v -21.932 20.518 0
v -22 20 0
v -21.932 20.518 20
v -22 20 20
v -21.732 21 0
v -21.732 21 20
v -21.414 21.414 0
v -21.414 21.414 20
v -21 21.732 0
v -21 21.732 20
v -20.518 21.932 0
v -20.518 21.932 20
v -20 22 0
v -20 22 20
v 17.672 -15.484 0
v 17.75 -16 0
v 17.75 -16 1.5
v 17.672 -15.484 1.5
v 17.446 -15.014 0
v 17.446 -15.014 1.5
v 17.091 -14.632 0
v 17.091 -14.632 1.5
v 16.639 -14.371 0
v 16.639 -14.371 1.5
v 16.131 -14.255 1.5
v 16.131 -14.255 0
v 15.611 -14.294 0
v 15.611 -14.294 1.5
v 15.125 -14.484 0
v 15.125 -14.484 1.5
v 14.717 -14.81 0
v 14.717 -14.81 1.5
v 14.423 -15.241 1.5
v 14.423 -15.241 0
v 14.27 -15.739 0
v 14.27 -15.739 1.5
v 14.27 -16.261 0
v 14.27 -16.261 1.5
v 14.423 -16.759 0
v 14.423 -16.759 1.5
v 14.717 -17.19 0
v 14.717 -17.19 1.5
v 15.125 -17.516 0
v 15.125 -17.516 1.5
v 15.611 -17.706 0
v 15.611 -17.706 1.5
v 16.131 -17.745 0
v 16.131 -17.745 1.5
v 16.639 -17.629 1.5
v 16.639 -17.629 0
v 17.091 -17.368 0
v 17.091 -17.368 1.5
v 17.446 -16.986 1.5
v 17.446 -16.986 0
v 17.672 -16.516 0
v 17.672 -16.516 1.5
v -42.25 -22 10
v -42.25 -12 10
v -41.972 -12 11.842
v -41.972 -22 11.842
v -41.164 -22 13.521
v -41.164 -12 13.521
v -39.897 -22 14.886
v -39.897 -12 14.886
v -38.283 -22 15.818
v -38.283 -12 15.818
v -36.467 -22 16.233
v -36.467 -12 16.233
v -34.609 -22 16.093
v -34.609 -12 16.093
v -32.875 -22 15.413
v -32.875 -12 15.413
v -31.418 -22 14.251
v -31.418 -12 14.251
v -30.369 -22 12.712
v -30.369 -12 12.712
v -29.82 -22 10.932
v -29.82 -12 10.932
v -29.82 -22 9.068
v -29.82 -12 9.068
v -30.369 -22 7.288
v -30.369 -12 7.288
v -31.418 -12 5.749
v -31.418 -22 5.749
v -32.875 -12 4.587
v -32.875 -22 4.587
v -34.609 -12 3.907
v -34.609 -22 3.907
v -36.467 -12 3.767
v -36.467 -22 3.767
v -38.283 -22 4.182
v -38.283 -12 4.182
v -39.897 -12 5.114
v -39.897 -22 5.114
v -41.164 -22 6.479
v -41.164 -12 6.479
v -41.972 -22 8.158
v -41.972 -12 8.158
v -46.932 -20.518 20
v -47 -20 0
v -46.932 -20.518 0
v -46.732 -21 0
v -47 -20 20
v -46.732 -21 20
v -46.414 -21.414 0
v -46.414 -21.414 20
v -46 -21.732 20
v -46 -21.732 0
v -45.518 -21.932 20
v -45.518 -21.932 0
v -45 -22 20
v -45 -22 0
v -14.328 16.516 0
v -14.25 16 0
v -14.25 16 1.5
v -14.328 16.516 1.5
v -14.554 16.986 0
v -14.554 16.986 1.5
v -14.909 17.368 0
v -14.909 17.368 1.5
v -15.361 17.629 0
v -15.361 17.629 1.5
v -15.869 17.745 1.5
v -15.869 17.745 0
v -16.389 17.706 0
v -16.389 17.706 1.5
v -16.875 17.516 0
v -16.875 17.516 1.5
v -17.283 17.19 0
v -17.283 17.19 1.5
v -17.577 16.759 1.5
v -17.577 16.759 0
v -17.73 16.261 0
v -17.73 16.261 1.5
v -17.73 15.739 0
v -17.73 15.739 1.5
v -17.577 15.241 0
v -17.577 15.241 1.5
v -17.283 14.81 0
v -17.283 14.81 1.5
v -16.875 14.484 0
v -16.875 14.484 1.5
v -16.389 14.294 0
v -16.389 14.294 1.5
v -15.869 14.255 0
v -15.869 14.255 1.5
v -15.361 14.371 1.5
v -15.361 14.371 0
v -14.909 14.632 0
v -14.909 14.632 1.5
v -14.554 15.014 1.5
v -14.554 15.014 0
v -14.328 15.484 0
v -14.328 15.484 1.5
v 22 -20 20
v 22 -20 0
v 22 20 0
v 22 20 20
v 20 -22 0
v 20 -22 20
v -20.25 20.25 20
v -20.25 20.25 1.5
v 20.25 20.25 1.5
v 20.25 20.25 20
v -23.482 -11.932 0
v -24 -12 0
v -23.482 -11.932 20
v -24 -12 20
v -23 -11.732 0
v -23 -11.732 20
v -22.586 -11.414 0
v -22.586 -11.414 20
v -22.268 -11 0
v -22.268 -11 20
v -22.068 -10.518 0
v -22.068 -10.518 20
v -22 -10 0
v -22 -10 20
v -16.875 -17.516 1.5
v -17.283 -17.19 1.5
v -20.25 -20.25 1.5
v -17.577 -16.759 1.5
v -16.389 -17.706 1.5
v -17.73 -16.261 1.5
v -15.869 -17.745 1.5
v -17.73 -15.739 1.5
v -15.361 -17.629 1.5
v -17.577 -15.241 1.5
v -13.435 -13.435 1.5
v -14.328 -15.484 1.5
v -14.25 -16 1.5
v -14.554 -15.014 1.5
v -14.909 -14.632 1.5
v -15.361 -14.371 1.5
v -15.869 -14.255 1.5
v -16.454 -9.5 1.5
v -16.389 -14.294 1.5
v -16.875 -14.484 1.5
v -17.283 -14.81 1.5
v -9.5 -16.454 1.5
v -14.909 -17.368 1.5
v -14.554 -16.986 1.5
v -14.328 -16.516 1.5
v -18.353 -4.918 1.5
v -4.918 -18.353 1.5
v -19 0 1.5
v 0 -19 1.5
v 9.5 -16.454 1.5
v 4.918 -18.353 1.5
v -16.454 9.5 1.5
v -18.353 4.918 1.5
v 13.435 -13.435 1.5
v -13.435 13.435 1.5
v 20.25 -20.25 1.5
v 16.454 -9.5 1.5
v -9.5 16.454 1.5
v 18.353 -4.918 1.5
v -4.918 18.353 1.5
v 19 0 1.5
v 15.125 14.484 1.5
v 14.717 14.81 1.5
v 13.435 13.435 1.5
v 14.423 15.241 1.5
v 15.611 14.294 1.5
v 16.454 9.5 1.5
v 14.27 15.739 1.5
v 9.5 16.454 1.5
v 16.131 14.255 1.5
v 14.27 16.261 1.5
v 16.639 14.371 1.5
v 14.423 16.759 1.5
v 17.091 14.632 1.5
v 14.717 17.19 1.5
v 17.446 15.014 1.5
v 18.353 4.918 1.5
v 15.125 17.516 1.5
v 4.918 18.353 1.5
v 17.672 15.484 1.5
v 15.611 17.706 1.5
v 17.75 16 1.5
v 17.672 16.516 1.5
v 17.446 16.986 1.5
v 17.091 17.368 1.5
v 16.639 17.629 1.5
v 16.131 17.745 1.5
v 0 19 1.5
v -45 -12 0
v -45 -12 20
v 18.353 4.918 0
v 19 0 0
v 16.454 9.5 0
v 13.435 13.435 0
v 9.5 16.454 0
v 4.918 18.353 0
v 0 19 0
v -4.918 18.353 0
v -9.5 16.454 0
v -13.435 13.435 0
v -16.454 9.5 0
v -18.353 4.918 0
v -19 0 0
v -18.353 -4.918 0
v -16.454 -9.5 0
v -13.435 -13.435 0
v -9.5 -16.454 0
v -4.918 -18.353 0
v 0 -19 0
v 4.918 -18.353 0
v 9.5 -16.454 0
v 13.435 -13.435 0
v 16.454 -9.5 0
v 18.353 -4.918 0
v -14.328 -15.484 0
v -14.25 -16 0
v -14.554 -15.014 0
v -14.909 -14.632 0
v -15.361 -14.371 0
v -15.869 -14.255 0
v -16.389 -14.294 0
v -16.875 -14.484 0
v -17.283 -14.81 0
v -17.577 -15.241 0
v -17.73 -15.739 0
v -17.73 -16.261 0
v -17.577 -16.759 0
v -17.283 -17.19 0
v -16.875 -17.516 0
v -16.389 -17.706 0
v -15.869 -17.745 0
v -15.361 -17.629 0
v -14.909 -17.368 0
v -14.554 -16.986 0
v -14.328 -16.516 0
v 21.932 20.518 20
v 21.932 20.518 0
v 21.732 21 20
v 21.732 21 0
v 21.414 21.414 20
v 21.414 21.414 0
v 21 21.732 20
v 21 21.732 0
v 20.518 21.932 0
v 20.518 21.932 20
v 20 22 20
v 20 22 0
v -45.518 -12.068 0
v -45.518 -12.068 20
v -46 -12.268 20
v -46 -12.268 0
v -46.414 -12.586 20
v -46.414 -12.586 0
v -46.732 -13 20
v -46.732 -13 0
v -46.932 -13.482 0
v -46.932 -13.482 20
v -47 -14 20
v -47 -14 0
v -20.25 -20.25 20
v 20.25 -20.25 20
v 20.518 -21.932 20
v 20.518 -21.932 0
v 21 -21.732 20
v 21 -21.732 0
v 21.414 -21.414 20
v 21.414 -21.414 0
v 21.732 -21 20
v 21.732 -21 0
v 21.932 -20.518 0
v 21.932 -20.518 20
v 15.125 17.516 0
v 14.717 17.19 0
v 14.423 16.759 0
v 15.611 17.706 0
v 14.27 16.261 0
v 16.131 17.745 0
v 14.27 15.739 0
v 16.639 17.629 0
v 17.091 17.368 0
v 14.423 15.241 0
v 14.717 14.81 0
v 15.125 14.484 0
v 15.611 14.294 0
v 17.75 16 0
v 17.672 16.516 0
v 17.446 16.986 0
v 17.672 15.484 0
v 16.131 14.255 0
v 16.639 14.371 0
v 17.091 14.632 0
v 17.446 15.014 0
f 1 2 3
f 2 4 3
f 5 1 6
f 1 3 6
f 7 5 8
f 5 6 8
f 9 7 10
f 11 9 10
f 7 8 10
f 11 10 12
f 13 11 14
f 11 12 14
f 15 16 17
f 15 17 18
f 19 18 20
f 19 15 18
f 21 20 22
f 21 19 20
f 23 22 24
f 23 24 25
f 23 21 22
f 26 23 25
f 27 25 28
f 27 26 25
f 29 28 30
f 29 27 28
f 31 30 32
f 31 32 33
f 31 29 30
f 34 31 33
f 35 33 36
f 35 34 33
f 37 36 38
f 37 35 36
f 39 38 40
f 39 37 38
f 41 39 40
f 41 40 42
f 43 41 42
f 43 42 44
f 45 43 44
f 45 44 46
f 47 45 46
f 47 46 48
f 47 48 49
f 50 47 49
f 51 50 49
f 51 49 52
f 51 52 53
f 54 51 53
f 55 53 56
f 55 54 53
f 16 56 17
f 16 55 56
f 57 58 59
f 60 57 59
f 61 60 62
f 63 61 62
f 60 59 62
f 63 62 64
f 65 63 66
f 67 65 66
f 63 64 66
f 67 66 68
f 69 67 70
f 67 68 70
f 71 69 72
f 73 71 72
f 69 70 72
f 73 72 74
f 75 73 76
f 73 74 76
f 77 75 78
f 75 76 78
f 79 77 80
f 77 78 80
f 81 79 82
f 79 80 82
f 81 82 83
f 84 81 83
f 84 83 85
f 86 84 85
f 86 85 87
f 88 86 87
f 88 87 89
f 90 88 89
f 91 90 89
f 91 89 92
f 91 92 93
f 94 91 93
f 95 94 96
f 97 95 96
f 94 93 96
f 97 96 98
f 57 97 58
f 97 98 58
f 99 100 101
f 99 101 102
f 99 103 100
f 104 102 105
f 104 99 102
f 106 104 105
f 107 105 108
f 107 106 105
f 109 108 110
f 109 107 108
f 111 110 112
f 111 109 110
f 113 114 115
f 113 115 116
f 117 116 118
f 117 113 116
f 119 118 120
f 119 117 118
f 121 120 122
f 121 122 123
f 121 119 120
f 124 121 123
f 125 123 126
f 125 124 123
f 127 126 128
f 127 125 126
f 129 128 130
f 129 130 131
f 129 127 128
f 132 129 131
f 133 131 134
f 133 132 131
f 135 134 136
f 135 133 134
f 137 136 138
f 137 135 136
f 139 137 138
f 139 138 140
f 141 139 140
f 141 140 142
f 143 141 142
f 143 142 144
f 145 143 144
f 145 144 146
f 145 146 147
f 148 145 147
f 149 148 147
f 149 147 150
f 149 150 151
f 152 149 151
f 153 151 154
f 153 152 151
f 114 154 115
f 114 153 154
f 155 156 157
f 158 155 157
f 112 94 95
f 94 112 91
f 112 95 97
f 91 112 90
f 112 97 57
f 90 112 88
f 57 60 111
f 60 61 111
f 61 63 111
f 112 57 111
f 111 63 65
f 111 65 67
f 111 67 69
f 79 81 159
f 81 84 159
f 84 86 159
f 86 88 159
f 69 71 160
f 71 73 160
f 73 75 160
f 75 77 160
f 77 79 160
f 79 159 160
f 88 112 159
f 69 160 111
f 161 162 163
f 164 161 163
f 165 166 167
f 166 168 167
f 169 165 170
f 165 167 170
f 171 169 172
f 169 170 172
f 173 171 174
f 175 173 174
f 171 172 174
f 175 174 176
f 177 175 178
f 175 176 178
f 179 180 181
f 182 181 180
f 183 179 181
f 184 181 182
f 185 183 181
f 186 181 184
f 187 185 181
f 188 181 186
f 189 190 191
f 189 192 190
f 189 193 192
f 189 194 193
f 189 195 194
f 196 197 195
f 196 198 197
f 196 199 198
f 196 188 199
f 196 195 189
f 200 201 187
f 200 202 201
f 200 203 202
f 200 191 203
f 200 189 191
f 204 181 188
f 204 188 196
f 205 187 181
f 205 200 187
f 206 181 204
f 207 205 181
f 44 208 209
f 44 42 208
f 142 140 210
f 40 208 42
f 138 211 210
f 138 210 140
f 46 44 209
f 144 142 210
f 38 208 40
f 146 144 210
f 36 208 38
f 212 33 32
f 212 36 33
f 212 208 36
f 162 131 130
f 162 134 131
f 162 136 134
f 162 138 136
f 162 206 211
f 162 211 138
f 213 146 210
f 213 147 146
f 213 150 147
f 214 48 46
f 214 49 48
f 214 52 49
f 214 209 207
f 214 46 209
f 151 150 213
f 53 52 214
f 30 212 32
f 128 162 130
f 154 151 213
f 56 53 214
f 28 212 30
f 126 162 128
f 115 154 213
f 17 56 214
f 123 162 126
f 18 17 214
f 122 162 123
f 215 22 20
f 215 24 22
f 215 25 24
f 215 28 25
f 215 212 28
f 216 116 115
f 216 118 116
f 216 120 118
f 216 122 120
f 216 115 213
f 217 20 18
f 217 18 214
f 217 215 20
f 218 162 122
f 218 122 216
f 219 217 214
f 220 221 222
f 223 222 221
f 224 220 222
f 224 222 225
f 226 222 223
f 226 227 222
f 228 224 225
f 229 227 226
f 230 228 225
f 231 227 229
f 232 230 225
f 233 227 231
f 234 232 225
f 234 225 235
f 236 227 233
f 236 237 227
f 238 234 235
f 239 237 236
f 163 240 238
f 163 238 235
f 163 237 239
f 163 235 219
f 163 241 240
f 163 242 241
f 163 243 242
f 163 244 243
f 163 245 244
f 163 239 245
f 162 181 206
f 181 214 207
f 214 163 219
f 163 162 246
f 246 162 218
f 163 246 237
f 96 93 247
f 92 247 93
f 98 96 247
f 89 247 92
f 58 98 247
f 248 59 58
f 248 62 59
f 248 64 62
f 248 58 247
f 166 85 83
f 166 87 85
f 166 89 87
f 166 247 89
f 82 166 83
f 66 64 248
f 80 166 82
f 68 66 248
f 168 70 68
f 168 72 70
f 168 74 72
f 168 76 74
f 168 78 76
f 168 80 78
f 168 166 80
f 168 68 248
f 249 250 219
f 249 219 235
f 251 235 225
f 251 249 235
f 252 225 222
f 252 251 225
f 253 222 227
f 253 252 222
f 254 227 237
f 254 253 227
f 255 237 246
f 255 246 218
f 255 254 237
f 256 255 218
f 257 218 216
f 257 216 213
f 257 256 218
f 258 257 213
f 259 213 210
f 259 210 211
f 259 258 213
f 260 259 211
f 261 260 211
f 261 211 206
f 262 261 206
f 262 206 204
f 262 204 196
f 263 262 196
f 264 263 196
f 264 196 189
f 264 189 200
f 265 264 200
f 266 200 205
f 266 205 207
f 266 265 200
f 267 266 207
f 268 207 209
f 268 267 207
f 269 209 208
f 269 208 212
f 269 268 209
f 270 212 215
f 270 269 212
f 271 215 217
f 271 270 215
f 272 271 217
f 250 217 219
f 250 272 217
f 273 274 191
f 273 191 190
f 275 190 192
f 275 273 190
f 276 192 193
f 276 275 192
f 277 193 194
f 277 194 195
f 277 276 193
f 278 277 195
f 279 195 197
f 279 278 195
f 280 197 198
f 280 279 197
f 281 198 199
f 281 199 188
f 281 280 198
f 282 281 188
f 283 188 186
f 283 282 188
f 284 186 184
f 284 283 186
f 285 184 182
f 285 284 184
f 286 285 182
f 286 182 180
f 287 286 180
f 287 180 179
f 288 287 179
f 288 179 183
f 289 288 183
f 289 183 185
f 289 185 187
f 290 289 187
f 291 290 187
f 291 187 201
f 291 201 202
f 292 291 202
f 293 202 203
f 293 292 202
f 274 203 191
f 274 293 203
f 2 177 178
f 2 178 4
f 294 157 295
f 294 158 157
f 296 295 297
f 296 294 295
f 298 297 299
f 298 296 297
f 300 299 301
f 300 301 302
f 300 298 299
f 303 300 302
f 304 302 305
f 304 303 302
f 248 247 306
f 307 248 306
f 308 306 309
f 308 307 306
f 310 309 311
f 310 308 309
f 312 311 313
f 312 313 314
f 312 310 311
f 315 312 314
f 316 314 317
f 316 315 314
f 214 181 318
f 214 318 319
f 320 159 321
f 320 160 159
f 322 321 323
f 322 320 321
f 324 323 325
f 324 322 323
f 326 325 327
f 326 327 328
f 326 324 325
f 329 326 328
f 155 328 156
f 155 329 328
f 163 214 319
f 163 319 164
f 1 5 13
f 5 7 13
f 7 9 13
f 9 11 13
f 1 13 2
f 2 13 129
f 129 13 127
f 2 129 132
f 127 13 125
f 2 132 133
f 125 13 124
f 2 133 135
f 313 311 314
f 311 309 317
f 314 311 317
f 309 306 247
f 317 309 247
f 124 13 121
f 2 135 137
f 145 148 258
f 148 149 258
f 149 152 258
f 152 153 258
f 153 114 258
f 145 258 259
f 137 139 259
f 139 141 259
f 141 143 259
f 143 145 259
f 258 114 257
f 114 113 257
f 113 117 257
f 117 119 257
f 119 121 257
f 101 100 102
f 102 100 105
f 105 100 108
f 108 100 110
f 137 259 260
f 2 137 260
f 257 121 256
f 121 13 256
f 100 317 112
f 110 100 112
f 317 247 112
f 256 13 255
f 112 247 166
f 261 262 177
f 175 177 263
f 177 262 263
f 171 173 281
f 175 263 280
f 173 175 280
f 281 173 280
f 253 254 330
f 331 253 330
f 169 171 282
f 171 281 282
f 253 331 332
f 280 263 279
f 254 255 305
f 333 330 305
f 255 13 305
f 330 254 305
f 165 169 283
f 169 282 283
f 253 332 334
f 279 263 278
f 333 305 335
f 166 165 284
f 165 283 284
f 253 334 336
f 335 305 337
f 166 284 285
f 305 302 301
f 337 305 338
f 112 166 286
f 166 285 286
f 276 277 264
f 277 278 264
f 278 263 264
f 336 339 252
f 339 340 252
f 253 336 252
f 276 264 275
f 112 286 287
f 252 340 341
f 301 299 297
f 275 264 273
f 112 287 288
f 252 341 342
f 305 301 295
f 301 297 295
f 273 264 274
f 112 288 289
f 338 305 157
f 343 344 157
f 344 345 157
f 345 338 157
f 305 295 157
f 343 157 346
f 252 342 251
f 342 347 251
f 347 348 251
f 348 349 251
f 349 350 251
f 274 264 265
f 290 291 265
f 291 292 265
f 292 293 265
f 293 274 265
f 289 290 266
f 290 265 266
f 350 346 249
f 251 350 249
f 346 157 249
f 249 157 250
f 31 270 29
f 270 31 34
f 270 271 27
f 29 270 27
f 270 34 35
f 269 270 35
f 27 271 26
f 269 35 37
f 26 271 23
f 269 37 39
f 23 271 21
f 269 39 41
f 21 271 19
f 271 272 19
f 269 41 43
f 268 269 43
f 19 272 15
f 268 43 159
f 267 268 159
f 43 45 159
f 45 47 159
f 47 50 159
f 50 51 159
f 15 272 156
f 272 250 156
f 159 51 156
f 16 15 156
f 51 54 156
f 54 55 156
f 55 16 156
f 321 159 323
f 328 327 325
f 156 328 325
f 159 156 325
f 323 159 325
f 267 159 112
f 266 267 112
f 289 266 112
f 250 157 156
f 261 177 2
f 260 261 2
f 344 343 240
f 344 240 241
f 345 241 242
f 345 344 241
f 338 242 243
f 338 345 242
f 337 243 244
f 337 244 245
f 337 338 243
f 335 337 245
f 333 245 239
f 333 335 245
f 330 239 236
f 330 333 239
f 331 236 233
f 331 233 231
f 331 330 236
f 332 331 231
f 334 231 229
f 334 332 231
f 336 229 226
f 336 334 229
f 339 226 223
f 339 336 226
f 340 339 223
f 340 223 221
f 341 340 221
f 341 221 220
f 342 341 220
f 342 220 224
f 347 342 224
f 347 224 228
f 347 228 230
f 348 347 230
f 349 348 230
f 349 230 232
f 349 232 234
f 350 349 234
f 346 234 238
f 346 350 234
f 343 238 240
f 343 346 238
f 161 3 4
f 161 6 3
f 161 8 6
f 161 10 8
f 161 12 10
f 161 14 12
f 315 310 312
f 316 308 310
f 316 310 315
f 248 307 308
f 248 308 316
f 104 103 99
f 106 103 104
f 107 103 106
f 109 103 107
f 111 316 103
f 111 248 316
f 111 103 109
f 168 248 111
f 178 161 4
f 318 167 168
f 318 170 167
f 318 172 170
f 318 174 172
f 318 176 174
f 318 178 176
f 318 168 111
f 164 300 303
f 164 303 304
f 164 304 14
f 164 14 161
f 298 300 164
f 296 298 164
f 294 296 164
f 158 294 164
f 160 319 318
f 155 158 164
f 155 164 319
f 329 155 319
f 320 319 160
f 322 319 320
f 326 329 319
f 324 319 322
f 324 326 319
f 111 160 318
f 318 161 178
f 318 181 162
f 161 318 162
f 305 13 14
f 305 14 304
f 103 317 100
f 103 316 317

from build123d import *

# Parameters (mm, degrees)
F0_W     = 44
F0_H     = 44
F0_W_2   = 40.5
F0_H_2   = 40.5
F1_DEPTH = 20
F0_R     = 1.75
F0_R_2   = 19
F2_DEPTH = 1.5
F3_W     = 10
F3_H     = 20
F4_DEPTH = 25
F5_R     = 6.25
F6_DEPTH = 10
F7_R     = 2


with BuildPart() as f1:
    # F0 (on Top) → F1 (new body)
    with BuildSketch(Plane.XY):
        Rectangle(F0_W, F0_H)
        Rectangle(F0_W_2, F0_H_2, mode=Mode.SUBTRACT)
    extrude(amount=F1_DEPTH)

    # F0 (on Top) → F2 (join)
    with BuildSketch(Plane.XY):
        Rectangle(F0_W_2, F0_H_2)
        with Locations((-16, -16)):
            Circle(F0_R, mode=Mode.SUBTRACT)
        with Locations((16, -16)):
            Circle(F0_R, mode=Mode.SUBTRACT)
        with Locations((-16, 16)):
            Circle(F0_R, mode=Mode.SUBTRACT)
        Circle(F0_R_2, mode=Mode.SUBTRACT)
        with Locations((16, 16)):
            Circle(F0_R, mode=Mode.SUBTRACT)
    extrude(amount=F2_DEPTH)

    # F3 (on face) → F4 (join)
    with BuildSketch(Plane(origin=(-22, 0, 0), x_dir=(0, -1, 0), z_dir=(-1, 0, 0))):
        with Locations((17, 10)):
            Rectangle(F3_W, F3_H)
    extrude(amount=F4_DEPTH)

    # F5 (on face) → F6 (cut)
    with BuildSketch(Plane(origin=(0, -12, 0), x_dir=(-1, 0, 0), z_dir=(0, 1, 0))):
        with Locations((36, 10)):
            Circle(F5_R)
    extrude(amount=-F6_DEPTH, mode=Mode.SUBTRACT)

    # F7
    f7_edges = [f1.edges().sort_by_distance(p)[0] for p in [
        (-22, -12, 10),
        (-22, 22, 10),
        (22, 22, 10),
        (22, -22, 10),
        (-47, -12, 10),
        (-47, -22, 10),
    ]]
    fillet(f7_edges, radius=F7_R)


solid = f1.part
